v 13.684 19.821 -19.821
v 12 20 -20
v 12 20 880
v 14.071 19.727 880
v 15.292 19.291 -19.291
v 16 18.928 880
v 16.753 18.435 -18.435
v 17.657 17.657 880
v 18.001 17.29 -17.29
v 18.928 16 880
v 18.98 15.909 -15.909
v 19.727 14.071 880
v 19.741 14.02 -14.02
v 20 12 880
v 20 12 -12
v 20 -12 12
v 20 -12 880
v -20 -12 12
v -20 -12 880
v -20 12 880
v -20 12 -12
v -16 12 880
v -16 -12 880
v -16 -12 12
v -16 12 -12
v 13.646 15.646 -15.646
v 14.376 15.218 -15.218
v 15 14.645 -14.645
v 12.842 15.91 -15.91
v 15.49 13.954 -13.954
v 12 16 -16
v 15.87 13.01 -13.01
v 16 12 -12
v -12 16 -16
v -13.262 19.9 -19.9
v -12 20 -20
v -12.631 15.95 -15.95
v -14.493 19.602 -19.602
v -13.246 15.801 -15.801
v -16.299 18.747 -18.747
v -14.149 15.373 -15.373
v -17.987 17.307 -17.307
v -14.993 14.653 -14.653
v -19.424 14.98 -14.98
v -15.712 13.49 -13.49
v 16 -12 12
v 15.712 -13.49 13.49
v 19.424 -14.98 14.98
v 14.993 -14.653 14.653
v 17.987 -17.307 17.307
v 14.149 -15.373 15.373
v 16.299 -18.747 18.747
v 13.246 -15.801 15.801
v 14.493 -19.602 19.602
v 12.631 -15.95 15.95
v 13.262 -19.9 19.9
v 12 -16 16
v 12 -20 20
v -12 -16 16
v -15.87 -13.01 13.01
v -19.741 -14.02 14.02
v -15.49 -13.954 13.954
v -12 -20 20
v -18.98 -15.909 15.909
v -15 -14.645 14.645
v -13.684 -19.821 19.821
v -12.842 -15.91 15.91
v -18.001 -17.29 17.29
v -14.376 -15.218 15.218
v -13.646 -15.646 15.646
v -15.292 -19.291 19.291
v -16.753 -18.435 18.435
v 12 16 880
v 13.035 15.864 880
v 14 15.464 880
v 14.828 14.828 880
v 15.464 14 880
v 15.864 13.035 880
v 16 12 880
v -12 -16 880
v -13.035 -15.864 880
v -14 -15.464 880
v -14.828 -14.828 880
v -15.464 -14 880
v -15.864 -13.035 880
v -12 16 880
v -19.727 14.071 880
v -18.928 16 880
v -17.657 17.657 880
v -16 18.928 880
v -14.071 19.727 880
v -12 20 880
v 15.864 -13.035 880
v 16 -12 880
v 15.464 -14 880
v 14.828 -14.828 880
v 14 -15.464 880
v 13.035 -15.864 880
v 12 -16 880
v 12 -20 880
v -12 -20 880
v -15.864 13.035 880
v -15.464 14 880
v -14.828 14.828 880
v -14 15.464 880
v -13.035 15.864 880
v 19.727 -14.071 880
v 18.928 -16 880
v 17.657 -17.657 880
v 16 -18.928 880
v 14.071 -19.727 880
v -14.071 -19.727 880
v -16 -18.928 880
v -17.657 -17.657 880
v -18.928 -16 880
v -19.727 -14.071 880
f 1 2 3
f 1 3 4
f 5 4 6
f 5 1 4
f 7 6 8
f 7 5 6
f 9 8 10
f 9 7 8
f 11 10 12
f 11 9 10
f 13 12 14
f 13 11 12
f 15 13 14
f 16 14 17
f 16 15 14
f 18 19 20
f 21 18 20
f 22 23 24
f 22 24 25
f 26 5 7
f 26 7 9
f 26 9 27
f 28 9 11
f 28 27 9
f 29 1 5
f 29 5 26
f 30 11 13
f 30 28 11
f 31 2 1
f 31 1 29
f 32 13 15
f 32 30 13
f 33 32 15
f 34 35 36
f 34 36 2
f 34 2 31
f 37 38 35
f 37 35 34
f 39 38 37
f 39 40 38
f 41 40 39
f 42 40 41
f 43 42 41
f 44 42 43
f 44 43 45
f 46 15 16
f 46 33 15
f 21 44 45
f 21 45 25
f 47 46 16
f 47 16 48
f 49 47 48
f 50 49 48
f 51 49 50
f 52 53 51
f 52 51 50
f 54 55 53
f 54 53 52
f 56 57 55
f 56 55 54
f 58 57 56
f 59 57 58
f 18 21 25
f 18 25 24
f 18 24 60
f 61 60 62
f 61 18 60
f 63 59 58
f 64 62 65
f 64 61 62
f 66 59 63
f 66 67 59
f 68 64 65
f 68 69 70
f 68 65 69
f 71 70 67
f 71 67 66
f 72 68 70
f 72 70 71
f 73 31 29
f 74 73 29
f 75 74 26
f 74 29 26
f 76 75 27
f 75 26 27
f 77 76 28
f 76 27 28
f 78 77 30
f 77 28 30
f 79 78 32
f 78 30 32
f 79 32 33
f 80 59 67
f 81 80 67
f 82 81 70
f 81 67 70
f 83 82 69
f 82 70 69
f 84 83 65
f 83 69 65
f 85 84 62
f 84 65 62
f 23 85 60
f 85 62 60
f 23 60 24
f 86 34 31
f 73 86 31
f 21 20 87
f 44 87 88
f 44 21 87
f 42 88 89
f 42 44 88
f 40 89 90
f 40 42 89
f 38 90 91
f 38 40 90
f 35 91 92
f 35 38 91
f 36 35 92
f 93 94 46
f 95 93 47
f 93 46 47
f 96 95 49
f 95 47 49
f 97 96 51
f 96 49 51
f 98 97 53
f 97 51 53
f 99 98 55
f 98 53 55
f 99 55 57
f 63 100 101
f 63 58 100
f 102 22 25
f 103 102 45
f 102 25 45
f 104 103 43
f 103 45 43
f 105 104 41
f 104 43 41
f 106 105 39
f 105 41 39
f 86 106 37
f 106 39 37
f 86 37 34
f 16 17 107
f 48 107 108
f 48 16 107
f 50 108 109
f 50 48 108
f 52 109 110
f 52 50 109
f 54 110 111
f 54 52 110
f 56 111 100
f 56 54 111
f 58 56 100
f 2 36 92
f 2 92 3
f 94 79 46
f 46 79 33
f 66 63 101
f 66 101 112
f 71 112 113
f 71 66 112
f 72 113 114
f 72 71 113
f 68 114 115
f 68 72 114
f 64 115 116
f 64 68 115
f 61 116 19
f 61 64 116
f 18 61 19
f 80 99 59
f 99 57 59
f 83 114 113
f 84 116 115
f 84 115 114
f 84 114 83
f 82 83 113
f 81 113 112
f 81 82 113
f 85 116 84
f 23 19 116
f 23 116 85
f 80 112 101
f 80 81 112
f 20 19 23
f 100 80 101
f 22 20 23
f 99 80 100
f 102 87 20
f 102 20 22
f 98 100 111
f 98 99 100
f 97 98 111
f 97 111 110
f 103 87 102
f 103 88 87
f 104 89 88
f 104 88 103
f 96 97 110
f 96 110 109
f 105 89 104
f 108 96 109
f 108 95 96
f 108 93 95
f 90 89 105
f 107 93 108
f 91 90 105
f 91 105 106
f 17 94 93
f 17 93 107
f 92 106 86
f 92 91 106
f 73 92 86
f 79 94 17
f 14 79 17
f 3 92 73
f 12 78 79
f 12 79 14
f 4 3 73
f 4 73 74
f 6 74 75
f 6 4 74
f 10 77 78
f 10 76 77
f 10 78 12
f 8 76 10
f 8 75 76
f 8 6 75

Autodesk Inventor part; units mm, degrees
ref_plane "Start plane" through (0, 0, -20) normal (0, 0, 1) x (1, 0, 0)
ref_plane "End plane" through (0, 0, 880) normal (0, 0, 1) x (1, 0, 0)
sketch "Sketch" plane through (0, 0, 0) normal (0, 0, 1) x (1, 0, 0)
  line L0 (-20, -12) -> (-20, 12)
  line L1 (-12, 20) -> (12, 20)
  line L2 (20, 12) -> (20, -12)
  line L3 (12, -20) -> (-12, -20)
  arc A0 (-20, -12) -> (-12, -20) centre (-12, -12) ccw
  arc A1 (-12, 20) -> (-20, 12) centre (-12, 12) ccw
  arc A2 (20, 12) -> (12, 20) centre (12, 12) ccw
  arc A3 (12, -20) -> (20, -12) centre (12, -12) ccw
  arc A4 (-12, 16) -> (-16, 12) centre (-12, 12) ccw
  line L4 (-12, 16) -> (12, 16)
  arc A5 (16, 12) -> (12, 16) centre (12, 12) ccw
  line L5 (16, 12) -> (16, -12)
  arc A6 (12, -16) -> (16, -12) centre (12, -12) ccw
  line L6 (12, -16) -> (-12, -16)
  arc A7 (-16, -12) -> (-12, -16) centre (-12, -12) ccw
  line L7 (-16, -12) -> (-16, 12)
  line L8 (0, 30.3196) -> (0, -30.3196) construction
  line L9 (-30.3196, 0) -> (30.3196, 0) construction
  dimension "d7" = 8
  dimension "d10" = 40
  dimension "d11" = 40
  dimension "d12" = 4
  dimension "d15" = 20
  dimension "d16" = 20
extrude "Body" add sketch "Sketch" along normal up to surface (900 mm away) from surface at -20
sketch "Sketch3" plane through (0, 0, 0) normal (0, 0, 1) x (1, 0, 0)
  line L0 (0, 0) -> (10, 0)
ref_plane "Work Plane3" through (0, 0, 0) normal (0, -1, 0) x (1, 0, 0)
sketch "Sketch4" plane through (0, 0, 0) normal (0, -1, 0) x (1, 0, 0)
  line L0 (-2, -20) -> (12, -20)
  line L1 (-2, 880) -> (12, 880)
  dimension "d18" = 900
ref_plane "Work Plane4" through (0, 20, -20) normal (0, -0.7071, -0.7071) x (1, 0, 0)
split "Split1" plane through (0, 20, -20) removes the side toward (0, -0.7071, -0.7071)
ref_plane "Work Plane5" through (0, 20, 1520) normal (0, -0.7071, 0.7071) x (1, 0, 0)
split "Split2" plane through (0, 20, 1520) removes the side toward (0, -0.7071, 0.7071)
ref_plane "Work Plane6" through (-1000, 12, 880) normal (0, 0, 1) x (1, 0, 0)
split "Split3" plane through (-1000, 12, 880) removes the side toward (0, 0, 1)
equation "\"d7\" = G_IR"
equation "\"d10\" = G_H"
equation "\"d11\" = G_W"
equation "\"d12\" = G_T"
equation "\"d15\" = 0.5 * d10"
equation "\"d16\" = 0.5 * d11"
equation "\"d3\" = G_L"
equation "\"G_W\" = 40"
equation "\"G_H\" = 40"
equation "\"G_T\" = 4"
equation "\"G_IR\" = 8"
equation "\"G_L\" = d18"
equation "\"G_OFFSET_START\" = 20"
equation "\"G_OFFSET_END\" = -620"
equation "\"d13\" = -G_OFFSET_START"
equation "\"d14\" = G_OFFSET_END + B_L"
equation "\"B_L\" = 1500"
properties part number "DIN EN 10219-2 - 40 x 40 x 4  - 900" material "Steel, Mild"
